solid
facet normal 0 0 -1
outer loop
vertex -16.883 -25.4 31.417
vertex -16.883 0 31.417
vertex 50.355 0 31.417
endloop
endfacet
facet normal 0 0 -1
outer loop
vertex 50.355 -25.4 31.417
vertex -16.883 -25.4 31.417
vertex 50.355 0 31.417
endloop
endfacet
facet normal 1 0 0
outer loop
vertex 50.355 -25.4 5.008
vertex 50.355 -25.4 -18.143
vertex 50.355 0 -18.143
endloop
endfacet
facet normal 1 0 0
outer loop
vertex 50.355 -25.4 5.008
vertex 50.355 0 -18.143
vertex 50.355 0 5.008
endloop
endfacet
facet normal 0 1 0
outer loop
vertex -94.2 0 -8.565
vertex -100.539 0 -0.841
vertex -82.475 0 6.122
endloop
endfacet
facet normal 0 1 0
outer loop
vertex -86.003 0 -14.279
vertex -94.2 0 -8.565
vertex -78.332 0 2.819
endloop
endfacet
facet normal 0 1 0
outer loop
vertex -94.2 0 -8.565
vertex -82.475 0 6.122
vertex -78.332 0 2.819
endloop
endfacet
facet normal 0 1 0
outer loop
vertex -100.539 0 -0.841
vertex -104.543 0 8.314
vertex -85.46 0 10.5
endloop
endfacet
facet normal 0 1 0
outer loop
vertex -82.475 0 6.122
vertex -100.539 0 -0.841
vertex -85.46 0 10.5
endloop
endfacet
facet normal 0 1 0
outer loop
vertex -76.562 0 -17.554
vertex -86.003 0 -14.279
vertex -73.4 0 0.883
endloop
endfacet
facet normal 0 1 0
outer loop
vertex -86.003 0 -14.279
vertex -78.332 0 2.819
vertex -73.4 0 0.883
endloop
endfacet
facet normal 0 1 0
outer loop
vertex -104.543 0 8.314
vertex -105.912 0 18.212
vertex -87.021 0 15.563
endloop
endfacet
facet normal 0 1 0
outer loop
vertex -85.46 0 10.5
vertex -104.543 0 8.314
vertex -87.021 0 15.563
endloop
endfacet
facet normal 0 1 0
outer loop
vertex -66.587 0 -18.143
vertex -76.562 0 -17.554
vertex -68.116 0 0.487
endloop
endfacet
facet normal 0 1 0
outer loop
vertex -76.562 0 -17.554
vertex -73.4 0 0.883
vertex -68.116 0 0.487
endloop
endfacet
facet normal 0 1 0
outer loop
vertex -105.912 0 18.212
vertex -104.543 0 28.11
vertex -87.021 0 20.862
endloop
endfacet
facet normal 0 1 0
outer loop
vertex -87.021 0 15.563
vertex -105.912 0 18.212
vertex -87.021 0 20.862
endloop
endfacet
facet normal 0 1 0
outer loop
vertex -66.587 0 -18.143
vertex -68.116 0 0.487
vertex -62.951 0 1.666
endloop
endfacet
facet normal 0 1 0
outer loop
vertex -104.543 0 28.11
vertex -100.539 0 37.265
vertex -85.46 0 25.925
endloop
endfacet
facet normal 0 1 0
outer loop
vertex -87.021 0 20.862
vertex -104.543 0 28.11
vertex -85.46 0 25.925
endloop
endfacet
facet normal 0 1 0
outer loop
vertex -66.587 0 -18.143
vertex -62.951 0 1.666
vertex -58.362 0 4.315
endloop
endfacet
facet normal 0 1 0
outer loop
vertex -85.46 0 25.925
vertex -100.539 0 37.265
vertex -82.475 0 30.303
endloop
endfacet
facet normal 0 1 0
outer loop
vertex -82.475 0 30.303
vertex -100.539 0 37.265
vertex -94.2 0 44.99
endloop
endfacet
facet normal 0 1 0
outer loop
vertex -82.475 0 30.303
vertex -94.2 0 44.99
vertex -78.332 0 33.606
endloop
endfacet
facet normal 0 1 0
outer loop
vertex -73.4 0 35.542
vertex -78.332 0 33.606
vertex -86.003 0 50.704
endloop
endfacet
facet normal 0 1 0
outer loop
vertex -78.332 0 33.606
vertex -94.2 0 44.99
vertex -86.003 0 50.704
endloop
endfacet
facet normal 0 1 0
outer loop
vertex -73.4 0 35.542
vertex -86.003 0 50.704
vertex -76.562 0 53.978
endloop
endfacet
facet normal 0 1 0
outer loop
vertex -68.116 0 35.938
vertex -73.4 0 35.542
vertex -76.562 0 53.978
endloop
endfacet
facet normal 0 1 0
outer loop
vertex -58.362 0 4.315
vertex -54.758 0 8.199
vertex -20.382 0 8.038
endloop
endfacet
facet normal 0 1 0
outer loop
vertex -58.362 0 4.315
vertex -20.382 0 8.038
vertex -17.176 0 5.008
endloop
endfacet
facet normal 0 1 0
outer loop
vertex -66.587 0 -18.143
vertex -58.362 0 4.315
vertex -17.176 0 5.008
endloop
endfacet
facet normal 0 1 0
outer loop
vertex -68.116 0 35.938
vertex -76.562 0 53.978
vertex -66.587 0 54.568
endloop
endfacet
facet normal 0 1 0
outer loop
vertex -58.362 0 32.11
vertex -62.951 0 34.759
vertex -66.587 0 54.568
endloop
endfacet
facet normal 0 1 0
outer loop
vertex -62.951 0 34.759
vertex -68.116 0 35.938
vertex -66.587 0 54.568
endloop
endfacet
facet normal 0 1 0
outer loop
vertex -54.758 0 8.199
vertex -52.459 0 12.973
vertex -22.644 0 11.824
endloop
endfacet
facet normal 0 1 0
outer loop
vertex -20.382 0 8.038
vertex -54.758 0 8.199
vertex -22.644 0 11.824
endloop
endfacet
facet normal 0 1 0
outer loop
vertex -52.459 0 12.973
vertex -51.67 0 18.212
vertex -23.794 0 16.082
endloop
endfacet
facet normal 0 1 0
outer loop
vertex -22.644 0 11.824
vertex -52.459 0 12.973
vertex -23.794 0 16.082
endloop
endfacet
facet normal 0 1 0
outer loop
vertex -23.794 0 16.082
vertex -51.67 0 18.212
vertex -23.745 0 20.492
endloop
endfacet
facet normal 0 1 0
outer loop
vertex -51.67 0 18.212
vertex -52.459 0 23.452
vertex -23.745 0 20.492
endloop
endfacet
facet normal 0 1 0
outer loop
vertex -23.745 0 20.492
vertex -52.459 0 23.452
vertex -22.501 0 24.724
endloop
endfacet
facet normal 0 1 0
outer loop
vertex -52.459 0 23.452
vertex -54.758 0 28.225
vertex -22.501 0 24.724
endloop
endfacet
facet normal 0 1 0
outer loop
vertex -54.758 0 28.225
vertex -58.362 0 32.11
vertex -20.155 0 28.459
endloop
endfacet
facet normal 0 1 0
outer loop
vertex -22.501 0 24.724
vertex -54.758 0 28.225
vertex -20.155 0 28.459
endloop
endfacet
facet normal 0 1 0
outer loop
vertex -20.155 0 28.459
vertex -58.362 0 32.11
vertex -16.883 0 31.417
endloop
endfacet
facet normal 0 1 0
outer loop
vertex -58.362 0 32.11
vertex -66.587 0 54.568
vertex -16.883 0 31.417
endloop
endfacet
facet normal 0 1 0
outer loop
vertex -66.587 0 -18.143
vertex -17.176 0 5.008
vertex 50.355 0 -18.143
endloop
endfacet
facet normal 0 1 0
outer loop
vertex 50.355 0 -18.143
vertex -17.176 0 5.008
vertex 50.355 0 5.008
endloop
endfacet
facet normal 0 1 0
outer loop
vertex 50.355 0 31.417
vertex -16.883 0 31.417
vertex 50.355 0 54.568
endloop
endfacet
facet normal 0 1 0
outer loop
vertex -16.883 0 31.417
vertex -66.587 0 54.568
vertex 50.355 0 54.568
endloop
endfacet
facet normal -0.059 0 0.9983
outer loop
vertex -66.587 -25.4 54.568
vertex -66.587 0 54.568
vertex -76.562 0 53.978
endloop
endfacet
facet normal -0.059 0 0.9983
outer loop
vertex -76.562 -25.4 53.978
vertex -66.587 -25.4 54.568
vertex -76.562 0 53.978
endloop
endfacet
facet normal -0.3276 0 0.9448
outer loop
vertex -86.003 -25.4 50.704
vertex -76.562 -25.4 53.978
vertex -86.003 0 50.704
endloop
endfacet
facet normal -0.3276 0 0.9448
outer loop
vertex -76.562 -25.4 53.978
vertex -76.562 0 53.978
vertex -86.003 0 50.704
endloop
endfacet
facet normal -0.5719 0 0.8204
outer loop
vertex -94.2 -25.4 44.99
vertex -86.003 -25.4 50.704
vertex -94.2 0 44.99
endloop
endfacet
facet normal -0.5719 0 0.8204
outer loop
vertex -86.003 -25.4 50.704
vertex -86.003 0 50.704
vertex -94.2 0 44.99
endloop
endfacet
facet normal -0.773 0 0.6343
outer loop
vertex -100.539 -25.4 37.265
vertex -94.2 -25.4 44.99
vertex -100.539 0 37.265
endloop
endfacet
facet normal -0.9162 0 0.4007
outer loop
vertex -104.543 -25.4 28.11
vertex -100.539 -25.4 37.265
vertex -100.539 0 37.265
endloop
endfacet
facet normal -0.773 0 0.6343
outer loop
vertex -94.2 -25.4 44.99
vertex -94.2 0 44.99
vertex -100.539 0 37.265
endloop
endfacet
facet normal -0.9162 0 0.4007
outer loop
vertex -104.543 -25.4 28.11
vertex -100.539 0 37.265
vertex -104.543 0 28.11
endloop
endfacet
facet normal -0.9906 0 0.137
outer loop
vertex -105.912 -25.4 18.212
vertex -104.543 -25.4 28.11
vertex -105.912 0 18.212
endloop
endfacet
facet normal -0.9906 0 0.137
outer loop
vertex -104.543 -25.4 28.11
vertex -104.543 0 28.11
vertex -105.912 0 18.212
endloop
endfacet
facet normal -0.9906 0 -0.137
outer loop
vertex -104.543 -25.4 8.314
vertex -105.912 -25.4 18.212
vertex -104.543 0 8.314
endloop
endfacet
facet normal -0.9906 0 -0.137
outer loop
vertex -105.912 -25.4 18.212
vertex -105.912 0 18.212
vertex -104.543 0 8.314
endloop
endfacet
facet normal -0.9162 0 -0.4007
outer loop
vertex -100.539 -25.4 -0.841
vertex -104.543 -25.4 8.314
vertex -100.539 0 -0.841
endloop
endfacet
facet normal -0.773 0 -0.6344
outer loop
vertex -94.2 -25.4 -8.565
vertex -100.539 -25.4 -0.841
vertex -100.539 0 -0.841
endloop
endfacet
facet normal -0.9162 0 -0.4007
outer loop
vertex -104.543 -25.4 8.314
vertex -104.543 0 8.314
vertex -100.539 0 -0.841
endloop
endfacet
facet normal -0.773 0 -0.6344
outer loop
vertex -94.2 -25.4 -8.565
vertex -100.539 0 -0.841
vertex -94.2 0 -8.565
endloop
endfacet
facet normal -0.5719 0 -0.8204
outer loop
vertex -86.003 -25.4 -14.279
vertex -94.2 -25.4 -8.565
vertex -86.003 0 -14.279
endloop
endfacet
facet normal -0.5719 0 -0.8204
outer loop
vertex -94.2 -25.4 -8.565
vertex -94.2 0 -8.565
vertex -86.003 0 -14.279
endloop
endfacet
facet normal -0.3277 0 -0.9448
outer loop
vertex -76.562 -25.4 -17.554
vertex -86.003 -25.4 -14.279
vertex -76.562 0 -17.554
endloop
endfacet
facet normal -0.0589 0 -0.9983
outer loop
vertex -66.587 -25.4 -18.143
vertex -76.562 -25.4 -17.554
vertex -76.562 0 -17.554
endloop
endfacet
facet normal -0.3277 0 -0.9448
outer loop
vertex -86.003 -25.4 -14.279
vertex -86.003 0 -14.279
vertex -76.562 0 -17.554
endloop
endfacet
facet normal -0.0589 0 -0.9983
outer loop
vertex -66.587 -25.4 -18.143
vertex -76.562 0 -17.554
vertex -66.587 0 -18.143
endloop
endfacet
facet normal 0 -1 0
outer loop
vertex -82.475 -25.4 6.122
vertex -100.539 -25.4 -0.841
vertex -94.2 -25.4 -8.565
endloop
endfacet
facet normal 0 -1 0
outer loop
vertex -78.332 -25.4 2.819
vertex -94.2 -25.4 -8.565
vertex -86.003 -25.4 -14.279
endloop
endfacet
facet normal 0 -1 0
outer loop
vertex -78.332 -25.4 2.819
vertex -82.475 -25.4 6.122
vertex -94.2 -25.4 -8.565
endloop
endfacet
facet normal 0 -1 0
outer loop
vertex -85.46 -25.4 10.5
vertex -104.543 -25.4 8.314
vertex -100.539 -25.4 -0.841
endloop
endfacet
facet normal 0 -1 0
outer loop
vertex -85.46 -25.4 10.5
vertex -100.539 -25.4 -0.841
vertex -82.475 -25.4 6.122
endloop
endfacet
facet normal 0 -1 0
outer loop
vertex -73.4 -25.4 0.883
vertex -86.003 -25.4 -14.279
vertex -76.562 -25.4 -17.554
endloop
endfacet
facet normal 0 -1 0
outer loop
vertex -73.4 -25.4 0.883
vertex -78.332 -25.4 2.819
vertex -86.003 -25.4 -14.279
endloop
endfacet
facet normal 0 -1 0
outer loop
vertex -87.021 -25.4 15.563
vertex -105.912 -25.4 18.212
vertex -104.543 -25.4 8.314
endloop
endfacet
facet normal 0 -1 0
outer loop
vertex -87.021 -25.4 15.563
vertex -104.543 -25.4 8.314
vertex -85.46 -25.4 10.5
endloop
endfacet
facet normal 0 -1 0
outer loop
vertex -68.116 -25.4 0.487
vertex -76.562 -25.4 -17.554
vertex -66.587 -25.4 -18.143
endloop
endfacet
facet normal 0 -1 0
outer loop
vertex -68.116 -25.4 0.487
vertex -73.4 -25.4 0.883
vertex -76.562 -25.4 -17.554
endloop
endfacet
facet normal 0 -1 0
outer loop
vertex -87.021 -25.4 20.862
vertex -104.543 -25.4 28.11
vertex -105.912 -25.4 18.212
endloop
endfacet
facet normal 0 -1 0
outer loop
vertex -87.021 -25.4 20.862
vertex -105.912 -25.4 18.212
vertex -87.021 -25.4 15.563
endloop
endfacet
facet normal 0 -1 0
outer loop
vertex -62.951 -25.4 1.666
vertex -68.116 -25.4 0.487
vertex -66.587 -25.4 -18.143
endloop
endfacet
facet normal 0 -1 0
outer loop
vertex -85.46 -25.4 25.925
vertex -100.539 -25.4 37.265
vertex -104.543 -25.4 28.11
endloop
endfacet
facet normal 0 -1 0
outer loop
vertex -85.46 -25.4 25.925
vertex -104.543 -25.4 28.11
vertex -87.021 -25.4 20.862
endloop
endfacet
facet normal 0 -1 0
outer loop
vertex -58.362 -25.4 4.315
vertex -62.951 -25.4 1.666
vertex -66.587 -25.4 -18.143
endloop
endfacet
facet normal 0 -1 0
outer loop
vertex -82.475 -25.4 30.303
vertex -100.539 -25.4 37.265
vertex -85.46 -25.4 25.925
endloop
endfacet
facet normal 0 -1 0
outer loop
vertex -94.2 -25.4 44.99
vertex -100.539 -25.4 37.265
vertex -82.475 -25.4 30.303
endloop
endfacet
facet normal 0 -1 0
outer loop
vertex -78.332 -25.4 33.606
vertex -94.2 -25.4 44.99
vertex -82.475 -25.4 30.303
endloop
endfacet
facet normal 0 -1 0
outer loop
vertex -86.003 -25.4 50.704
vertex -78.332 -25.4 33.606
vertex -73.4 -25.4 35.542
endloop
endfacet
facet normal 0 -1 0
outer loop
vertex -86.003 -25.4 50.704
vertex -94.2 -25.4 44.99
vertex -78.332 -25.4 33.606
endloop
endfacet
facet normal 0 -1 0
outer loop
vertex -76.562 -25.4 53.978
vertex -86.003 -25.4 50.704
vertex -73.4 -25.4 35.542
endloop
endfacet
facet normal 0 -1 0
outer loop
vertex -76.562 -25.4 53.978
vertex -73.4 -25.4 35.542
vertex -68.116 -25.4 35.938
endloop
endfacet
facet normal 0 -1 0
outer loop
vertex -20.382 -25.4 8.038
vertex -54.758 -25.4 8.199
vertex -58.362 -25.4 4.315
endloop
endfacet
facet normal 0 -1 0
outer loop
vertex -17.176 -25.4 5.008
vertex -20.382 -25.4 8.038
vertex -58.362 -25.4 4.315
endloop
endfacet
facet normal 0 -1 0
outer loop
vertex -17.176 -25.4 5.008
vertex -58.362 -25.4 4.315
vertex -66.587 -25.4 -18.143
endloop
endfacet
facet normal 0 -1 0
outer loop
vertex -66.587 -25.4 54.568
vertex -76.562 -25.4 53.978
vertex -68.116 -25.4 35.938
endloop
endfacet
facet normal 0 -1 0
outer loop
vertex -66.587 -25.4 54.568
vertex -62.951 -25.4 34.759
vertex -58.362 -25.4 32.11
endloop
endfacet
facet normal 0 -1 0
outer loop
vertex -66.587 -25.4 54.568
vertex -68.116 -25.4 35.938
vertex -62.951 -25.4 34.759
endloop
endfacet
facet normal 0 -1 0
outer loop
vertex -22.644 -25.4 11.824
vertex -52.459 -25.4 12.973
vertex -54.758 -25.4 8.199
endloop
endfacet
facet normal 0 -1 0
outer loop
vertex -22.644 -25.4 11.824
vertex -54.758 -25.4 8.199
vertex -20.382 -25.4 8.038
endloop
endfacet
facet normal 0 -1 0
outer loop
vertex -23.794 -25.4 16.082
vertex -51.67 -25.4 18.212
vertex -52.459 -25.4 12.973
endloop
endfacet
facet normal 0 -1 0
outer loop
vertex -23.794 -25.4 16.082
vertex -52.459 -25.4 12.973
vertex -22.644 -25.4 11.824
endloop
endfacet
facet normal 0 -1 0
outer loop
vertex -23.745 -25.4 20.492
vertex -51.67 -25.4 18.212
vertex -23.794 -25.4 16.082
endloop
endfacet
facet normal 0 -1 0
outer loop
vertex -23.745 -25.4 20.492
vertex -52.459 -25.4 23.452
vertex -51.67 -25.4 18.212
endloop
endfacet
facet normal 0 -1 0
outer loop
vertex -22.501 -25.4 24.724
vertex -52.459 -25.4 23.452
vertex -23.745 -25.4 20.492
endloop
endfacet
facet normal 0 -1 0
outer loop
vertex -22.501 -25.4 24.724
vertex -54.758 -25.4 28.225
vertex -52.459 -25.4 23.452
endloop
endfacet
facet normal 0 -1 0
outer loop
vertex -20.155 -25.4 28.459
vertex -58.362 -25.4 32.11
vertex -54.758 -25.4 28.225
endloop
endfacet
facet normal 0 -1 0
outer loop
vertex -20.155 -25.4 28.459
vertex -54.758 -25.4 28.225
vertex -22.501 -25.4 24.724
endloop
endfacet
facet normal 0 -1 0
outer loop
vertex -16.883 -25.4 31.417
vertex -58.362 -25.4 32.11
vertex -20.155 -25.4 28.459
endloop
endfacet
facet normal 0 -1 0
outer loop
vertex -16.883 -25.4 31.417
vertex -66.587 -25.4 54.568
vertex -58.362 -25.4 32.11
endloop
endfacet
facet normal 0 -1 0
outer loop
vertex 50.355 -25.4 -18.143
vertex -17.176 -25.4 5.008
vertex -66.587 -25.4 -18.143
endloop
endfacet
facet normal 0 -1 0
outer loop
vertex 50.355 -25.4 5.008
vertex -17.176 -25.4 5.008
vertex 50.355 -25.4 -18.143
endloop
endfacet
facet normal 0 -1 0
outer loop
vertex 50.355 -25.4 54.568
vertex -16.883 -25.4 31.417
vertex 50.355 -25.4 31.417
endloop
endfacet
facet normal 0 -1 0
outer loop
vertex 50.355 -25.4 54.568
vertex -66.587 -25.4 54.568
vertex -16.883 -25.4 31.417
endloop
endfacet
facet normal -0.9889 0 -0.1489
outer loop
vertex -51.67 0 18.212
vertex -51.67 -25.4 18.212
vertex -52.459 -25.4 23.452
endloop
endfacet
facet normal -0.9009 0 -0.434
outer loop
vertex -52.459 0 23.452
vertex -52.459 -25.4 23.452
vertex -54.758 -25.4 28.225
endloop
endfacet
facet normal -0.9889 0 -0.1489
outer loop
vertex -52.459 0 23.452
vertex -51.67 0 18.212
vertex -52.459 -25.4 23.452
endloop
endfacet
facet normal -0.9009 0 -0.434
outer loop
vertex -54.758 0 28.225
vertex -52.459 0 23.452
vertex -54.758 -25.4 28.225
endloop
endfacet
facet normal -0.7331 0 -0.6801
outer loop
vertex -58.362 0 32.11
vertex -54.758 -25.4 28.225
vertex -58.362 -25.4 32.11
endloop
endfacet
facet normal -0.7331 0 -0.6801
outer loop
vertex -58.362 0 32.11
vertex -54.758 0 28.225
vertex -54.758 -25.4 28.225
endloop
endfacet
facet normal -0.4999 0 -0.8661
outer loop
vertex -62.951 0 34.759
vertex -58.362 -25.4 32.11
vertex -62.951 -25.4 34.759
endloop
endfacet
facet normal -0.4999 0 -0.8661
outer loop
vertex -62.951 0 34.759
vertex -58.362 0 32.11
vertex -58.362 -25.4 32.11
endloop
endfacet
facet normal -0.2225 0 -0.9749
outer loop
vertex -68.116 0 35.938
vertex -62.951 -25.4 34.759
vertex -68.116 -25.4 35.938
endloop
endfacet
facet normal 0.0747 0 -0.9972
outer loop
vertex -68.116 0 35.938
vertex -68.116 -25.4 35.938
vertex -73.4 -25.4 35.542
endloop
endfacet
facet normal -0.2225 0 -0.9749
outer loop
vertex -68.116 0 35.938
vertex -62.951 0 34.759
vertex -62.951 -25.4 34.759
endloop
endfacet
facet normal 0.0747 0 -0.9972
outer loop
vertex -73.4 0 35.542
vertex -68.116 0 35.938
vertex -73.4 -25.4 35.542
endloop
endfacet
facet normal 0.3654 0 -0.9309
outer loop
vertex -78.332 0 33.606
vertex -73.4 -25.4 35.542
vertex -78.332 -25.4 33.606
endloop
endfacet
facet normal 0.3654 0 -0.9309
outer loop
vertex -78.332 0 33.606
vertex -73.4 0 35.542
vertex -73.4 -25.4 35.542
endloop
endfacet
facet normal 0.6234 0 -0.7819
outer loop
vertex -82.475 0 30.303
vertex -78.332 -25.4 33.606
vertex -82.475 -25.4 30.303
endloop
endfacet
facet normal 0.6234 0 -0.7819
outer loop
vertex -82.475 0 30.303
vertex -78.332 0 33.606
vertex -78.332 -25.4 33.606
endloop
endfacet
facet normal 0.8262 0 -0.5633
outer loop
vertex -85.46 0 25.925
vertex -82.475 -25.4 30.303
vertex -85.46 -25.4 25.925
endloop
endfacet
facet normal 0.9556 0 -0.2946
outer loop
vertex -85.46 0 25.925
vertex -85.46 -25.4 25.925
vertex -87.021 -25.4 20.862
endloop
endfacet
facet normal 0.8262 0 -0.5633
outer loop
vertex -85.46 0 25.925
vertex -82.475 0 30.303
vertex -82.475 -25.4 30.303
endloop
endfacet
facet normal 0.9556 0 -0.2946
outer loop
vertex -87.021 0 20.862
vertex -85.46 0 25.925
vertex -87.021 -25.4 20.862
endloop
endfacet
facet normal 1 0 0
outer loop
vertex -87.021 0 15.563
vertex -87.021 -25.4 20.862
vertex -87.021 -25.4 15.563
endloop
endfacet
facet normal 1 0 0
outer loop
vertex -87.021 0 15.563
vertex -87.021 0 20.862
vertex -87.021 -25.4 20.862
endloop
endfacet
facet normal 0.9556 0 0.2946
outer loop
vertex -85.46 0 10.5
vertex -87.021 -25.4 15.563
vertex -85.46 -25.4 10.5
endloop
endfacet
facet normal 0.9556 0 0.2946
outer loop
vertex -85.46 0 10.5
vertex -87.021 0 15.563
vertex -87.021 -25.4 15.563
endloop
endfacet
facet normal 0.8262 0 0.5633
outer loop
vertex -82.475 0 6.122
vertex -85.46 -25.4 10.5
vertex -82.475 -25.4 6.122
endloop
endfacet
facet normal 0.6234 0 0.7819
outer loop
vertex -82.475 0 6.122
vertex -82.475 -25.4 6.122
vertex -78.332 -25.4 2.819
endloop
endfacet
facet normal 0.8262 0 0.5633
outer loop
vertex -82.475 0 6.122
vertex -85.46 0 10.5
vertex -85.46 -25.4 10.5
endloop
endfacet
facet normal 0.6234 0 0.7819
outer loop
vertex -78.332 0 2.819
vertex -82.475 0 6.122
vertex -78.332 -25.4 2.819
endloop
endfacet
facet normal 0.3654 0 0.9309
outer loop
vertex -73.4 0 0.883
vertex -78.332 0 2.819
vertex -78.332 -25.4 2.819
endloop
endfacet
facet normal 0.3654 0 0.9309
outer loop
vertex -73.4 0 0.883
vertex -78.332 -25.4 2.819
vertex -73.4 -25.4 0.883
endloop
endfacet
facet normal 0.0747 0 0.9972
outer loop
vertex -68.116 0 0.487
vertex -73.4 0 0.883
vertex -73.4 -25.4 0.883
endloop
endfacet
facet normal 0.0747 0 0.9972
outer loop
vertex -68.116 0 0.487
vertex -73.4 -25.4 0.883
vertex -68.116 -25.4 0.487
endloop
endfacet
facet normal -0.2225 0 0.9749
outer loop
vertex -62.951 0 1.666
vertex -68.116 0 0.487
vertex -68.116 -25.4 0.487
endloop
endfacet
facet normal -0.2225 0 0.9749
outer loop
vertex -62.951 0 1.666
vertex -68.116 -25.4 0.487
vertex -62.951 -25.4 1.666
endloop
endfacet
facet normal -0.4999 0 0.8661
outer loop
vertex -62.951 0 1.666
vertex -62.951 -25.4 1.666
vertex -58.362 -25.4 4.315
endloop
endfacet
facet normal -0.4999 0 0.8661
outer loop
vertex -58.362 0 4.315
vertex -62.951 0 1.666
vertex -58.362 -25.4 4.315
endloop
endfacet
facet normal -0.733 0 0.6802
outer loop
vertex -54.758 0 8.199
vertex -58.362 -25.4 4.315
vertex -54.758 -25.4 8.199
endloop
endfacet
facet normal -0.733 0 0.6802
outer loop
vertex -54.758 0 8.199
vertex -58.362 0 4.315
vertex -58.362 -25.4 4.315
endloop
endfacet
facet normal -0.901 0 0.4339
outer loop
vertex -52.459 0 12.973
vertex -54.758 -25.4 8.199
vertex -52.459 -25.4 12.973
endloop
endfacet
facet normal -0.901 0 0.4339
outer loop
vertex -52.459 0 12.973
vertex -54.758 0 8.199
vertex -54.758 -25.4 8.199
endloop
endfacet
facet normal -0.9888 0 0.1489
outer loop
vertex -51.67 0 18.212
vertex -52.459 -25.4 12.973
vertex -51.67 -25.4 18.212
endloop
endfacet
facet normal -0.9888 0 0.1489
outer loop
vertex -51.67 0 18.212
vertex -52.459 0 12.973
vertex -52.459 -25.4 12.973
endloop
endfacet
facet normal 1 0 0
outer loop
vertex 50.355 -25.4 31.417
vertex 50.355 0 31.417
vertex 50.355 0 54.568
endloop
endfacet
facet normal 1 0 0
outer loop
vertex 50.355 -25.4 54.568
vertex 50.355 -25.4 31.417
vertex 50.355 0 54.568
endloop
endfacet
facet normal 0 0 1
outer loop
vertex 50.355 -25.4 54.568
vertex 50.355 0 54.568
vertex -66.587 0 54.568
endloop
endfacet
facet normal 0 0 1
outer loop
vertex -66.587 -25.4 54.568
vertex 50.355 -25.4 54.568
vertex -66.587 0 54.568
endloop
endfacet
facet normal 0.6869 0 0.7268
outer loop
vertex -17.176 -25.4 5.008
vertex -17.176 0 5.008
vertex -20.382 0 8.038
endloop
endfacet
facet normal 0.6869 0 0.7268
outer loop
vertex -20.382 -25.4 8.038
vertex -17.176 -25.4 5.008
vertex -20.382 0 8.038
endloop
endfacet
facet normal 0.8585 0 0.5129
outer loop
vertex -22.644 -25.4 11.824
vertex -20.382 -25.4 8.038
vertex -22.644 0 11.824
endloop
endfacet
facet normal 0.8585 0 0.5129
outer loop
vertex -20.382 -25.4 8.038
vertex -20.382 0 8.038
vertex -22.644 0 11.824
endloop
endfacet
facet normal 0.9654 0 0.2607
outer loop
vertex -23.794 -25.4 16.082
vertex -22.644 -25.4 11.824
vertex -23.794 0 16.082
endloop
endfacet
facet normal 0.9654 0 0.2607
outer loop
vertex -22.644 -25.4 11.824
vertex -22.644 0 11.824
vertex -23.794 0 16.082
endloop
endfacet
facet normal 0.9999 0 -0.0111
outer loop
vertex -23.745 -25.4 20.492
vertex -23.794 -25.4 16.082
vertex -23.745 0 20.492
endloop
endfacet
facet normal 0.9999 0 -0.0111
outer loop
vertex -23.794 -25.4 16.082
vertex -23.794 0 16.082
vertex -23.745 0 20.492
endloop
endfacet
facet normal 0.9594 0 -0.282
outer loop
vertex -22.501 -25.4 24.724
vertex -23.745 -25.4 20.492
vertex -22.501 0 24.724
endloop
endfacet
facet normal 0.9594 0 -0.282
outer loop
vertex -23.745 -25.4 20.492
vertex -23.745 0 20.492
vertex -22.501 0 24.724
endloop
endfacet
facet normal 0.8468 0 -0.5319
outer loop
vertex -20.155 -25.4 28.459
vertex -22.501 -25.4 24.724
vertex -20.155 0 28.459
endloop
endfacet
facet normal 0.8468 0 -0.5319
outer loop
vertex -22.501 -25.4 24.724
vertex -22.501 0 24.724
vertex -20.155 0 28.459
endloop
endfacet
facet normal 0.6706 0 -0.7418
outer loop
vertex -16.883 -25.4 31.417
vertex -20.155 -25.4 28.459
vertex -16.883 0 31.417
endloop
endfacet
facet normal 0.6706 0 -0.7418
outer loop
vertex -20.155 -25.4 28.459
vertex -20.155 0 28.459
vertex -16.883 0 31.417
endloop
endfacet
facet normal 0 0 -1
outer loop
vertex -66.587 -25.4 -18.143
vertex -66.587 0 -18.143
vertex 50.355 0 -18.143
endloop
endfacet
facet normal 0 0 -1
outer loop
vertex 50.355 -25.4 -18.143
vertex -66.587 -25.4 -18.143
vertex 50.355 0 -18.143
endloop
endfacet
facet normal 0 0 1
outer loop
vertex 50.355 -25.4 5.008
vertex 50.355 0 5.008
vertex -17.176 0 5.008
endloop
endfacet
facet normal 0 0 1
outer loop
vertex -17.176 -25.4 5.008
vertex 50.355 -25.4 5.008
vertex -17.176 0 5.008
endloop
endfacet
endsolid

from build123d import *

# Parameters (mm, degrees)
F0_R     = 17.775209
F1_DEPTH = 25.4


with BuildPart() as f1:
    # F0 (on Front) → F1 (new body)
    with BuildSketch(Plane.XZ):
        with BuildLine():
            ThreePointArc((-66.587123, -18.142906), (-42.667153, -6.543066), (-32.977377, 18.212327))
            ThreePointArc((-32.977377, 18.212327), (-42.667153, 42.96772), (-66.587123, 54.567559))
            ThreePointArc((-66.587123, 54.567559), (-105.912113, 18.212327), (-66.587123, -18.142906))
        make_face()
        with Locations((-69.444745, 18.212327)):
            Circle(F0_R, mode=Mode.SUBTRACT)
        with BuildLine():
            ThreePointArc((-66.587123, 54.567559), (-42.667153, 42.96772), (-32.977377, 18.212327))
            ThreePointArc((-32.977377, 18.212327), (-42.667153, -6.543066), (-66.587123, -18.142906))
            Line((-66.587123, -18.142906), (50.354917, -18.142906))
            Line((50.354917, -18.142906), (50.354917, 5.00767))
            Line((50.354917, 5.00767), (-17.176457, 5.00767))
            ThreePointArc((-17.176457, 5.00767), (-23.921096, 18.288839), (-16.882842, 31.41677))
            Line((-16.882842, 31.41677), (50.354917, 31.41677))
            Line((50.354917, 31.41677), (50.354917, 50.795339))
            ThreePointArc((50.354917, 50.795339), (45.72161, 53.463349), (40.490307, 54.567559))
            Line((40.490307, 54.567559), (-66.587123, 54.567559))
        make_face()
        with BuildLine():
            Line((50.354917, 54.567559), (40.490307, 54.567559))
            ThreePointArc((40.490307, 54.567559), (45.72161, 53.463349), (50.354917, 50.795339))
            Line((50.354917, 50.795339), (50.354917, 54.567559))
        make_face()
    extrude(amount=F1_DEPTH)


solid = f1.part
